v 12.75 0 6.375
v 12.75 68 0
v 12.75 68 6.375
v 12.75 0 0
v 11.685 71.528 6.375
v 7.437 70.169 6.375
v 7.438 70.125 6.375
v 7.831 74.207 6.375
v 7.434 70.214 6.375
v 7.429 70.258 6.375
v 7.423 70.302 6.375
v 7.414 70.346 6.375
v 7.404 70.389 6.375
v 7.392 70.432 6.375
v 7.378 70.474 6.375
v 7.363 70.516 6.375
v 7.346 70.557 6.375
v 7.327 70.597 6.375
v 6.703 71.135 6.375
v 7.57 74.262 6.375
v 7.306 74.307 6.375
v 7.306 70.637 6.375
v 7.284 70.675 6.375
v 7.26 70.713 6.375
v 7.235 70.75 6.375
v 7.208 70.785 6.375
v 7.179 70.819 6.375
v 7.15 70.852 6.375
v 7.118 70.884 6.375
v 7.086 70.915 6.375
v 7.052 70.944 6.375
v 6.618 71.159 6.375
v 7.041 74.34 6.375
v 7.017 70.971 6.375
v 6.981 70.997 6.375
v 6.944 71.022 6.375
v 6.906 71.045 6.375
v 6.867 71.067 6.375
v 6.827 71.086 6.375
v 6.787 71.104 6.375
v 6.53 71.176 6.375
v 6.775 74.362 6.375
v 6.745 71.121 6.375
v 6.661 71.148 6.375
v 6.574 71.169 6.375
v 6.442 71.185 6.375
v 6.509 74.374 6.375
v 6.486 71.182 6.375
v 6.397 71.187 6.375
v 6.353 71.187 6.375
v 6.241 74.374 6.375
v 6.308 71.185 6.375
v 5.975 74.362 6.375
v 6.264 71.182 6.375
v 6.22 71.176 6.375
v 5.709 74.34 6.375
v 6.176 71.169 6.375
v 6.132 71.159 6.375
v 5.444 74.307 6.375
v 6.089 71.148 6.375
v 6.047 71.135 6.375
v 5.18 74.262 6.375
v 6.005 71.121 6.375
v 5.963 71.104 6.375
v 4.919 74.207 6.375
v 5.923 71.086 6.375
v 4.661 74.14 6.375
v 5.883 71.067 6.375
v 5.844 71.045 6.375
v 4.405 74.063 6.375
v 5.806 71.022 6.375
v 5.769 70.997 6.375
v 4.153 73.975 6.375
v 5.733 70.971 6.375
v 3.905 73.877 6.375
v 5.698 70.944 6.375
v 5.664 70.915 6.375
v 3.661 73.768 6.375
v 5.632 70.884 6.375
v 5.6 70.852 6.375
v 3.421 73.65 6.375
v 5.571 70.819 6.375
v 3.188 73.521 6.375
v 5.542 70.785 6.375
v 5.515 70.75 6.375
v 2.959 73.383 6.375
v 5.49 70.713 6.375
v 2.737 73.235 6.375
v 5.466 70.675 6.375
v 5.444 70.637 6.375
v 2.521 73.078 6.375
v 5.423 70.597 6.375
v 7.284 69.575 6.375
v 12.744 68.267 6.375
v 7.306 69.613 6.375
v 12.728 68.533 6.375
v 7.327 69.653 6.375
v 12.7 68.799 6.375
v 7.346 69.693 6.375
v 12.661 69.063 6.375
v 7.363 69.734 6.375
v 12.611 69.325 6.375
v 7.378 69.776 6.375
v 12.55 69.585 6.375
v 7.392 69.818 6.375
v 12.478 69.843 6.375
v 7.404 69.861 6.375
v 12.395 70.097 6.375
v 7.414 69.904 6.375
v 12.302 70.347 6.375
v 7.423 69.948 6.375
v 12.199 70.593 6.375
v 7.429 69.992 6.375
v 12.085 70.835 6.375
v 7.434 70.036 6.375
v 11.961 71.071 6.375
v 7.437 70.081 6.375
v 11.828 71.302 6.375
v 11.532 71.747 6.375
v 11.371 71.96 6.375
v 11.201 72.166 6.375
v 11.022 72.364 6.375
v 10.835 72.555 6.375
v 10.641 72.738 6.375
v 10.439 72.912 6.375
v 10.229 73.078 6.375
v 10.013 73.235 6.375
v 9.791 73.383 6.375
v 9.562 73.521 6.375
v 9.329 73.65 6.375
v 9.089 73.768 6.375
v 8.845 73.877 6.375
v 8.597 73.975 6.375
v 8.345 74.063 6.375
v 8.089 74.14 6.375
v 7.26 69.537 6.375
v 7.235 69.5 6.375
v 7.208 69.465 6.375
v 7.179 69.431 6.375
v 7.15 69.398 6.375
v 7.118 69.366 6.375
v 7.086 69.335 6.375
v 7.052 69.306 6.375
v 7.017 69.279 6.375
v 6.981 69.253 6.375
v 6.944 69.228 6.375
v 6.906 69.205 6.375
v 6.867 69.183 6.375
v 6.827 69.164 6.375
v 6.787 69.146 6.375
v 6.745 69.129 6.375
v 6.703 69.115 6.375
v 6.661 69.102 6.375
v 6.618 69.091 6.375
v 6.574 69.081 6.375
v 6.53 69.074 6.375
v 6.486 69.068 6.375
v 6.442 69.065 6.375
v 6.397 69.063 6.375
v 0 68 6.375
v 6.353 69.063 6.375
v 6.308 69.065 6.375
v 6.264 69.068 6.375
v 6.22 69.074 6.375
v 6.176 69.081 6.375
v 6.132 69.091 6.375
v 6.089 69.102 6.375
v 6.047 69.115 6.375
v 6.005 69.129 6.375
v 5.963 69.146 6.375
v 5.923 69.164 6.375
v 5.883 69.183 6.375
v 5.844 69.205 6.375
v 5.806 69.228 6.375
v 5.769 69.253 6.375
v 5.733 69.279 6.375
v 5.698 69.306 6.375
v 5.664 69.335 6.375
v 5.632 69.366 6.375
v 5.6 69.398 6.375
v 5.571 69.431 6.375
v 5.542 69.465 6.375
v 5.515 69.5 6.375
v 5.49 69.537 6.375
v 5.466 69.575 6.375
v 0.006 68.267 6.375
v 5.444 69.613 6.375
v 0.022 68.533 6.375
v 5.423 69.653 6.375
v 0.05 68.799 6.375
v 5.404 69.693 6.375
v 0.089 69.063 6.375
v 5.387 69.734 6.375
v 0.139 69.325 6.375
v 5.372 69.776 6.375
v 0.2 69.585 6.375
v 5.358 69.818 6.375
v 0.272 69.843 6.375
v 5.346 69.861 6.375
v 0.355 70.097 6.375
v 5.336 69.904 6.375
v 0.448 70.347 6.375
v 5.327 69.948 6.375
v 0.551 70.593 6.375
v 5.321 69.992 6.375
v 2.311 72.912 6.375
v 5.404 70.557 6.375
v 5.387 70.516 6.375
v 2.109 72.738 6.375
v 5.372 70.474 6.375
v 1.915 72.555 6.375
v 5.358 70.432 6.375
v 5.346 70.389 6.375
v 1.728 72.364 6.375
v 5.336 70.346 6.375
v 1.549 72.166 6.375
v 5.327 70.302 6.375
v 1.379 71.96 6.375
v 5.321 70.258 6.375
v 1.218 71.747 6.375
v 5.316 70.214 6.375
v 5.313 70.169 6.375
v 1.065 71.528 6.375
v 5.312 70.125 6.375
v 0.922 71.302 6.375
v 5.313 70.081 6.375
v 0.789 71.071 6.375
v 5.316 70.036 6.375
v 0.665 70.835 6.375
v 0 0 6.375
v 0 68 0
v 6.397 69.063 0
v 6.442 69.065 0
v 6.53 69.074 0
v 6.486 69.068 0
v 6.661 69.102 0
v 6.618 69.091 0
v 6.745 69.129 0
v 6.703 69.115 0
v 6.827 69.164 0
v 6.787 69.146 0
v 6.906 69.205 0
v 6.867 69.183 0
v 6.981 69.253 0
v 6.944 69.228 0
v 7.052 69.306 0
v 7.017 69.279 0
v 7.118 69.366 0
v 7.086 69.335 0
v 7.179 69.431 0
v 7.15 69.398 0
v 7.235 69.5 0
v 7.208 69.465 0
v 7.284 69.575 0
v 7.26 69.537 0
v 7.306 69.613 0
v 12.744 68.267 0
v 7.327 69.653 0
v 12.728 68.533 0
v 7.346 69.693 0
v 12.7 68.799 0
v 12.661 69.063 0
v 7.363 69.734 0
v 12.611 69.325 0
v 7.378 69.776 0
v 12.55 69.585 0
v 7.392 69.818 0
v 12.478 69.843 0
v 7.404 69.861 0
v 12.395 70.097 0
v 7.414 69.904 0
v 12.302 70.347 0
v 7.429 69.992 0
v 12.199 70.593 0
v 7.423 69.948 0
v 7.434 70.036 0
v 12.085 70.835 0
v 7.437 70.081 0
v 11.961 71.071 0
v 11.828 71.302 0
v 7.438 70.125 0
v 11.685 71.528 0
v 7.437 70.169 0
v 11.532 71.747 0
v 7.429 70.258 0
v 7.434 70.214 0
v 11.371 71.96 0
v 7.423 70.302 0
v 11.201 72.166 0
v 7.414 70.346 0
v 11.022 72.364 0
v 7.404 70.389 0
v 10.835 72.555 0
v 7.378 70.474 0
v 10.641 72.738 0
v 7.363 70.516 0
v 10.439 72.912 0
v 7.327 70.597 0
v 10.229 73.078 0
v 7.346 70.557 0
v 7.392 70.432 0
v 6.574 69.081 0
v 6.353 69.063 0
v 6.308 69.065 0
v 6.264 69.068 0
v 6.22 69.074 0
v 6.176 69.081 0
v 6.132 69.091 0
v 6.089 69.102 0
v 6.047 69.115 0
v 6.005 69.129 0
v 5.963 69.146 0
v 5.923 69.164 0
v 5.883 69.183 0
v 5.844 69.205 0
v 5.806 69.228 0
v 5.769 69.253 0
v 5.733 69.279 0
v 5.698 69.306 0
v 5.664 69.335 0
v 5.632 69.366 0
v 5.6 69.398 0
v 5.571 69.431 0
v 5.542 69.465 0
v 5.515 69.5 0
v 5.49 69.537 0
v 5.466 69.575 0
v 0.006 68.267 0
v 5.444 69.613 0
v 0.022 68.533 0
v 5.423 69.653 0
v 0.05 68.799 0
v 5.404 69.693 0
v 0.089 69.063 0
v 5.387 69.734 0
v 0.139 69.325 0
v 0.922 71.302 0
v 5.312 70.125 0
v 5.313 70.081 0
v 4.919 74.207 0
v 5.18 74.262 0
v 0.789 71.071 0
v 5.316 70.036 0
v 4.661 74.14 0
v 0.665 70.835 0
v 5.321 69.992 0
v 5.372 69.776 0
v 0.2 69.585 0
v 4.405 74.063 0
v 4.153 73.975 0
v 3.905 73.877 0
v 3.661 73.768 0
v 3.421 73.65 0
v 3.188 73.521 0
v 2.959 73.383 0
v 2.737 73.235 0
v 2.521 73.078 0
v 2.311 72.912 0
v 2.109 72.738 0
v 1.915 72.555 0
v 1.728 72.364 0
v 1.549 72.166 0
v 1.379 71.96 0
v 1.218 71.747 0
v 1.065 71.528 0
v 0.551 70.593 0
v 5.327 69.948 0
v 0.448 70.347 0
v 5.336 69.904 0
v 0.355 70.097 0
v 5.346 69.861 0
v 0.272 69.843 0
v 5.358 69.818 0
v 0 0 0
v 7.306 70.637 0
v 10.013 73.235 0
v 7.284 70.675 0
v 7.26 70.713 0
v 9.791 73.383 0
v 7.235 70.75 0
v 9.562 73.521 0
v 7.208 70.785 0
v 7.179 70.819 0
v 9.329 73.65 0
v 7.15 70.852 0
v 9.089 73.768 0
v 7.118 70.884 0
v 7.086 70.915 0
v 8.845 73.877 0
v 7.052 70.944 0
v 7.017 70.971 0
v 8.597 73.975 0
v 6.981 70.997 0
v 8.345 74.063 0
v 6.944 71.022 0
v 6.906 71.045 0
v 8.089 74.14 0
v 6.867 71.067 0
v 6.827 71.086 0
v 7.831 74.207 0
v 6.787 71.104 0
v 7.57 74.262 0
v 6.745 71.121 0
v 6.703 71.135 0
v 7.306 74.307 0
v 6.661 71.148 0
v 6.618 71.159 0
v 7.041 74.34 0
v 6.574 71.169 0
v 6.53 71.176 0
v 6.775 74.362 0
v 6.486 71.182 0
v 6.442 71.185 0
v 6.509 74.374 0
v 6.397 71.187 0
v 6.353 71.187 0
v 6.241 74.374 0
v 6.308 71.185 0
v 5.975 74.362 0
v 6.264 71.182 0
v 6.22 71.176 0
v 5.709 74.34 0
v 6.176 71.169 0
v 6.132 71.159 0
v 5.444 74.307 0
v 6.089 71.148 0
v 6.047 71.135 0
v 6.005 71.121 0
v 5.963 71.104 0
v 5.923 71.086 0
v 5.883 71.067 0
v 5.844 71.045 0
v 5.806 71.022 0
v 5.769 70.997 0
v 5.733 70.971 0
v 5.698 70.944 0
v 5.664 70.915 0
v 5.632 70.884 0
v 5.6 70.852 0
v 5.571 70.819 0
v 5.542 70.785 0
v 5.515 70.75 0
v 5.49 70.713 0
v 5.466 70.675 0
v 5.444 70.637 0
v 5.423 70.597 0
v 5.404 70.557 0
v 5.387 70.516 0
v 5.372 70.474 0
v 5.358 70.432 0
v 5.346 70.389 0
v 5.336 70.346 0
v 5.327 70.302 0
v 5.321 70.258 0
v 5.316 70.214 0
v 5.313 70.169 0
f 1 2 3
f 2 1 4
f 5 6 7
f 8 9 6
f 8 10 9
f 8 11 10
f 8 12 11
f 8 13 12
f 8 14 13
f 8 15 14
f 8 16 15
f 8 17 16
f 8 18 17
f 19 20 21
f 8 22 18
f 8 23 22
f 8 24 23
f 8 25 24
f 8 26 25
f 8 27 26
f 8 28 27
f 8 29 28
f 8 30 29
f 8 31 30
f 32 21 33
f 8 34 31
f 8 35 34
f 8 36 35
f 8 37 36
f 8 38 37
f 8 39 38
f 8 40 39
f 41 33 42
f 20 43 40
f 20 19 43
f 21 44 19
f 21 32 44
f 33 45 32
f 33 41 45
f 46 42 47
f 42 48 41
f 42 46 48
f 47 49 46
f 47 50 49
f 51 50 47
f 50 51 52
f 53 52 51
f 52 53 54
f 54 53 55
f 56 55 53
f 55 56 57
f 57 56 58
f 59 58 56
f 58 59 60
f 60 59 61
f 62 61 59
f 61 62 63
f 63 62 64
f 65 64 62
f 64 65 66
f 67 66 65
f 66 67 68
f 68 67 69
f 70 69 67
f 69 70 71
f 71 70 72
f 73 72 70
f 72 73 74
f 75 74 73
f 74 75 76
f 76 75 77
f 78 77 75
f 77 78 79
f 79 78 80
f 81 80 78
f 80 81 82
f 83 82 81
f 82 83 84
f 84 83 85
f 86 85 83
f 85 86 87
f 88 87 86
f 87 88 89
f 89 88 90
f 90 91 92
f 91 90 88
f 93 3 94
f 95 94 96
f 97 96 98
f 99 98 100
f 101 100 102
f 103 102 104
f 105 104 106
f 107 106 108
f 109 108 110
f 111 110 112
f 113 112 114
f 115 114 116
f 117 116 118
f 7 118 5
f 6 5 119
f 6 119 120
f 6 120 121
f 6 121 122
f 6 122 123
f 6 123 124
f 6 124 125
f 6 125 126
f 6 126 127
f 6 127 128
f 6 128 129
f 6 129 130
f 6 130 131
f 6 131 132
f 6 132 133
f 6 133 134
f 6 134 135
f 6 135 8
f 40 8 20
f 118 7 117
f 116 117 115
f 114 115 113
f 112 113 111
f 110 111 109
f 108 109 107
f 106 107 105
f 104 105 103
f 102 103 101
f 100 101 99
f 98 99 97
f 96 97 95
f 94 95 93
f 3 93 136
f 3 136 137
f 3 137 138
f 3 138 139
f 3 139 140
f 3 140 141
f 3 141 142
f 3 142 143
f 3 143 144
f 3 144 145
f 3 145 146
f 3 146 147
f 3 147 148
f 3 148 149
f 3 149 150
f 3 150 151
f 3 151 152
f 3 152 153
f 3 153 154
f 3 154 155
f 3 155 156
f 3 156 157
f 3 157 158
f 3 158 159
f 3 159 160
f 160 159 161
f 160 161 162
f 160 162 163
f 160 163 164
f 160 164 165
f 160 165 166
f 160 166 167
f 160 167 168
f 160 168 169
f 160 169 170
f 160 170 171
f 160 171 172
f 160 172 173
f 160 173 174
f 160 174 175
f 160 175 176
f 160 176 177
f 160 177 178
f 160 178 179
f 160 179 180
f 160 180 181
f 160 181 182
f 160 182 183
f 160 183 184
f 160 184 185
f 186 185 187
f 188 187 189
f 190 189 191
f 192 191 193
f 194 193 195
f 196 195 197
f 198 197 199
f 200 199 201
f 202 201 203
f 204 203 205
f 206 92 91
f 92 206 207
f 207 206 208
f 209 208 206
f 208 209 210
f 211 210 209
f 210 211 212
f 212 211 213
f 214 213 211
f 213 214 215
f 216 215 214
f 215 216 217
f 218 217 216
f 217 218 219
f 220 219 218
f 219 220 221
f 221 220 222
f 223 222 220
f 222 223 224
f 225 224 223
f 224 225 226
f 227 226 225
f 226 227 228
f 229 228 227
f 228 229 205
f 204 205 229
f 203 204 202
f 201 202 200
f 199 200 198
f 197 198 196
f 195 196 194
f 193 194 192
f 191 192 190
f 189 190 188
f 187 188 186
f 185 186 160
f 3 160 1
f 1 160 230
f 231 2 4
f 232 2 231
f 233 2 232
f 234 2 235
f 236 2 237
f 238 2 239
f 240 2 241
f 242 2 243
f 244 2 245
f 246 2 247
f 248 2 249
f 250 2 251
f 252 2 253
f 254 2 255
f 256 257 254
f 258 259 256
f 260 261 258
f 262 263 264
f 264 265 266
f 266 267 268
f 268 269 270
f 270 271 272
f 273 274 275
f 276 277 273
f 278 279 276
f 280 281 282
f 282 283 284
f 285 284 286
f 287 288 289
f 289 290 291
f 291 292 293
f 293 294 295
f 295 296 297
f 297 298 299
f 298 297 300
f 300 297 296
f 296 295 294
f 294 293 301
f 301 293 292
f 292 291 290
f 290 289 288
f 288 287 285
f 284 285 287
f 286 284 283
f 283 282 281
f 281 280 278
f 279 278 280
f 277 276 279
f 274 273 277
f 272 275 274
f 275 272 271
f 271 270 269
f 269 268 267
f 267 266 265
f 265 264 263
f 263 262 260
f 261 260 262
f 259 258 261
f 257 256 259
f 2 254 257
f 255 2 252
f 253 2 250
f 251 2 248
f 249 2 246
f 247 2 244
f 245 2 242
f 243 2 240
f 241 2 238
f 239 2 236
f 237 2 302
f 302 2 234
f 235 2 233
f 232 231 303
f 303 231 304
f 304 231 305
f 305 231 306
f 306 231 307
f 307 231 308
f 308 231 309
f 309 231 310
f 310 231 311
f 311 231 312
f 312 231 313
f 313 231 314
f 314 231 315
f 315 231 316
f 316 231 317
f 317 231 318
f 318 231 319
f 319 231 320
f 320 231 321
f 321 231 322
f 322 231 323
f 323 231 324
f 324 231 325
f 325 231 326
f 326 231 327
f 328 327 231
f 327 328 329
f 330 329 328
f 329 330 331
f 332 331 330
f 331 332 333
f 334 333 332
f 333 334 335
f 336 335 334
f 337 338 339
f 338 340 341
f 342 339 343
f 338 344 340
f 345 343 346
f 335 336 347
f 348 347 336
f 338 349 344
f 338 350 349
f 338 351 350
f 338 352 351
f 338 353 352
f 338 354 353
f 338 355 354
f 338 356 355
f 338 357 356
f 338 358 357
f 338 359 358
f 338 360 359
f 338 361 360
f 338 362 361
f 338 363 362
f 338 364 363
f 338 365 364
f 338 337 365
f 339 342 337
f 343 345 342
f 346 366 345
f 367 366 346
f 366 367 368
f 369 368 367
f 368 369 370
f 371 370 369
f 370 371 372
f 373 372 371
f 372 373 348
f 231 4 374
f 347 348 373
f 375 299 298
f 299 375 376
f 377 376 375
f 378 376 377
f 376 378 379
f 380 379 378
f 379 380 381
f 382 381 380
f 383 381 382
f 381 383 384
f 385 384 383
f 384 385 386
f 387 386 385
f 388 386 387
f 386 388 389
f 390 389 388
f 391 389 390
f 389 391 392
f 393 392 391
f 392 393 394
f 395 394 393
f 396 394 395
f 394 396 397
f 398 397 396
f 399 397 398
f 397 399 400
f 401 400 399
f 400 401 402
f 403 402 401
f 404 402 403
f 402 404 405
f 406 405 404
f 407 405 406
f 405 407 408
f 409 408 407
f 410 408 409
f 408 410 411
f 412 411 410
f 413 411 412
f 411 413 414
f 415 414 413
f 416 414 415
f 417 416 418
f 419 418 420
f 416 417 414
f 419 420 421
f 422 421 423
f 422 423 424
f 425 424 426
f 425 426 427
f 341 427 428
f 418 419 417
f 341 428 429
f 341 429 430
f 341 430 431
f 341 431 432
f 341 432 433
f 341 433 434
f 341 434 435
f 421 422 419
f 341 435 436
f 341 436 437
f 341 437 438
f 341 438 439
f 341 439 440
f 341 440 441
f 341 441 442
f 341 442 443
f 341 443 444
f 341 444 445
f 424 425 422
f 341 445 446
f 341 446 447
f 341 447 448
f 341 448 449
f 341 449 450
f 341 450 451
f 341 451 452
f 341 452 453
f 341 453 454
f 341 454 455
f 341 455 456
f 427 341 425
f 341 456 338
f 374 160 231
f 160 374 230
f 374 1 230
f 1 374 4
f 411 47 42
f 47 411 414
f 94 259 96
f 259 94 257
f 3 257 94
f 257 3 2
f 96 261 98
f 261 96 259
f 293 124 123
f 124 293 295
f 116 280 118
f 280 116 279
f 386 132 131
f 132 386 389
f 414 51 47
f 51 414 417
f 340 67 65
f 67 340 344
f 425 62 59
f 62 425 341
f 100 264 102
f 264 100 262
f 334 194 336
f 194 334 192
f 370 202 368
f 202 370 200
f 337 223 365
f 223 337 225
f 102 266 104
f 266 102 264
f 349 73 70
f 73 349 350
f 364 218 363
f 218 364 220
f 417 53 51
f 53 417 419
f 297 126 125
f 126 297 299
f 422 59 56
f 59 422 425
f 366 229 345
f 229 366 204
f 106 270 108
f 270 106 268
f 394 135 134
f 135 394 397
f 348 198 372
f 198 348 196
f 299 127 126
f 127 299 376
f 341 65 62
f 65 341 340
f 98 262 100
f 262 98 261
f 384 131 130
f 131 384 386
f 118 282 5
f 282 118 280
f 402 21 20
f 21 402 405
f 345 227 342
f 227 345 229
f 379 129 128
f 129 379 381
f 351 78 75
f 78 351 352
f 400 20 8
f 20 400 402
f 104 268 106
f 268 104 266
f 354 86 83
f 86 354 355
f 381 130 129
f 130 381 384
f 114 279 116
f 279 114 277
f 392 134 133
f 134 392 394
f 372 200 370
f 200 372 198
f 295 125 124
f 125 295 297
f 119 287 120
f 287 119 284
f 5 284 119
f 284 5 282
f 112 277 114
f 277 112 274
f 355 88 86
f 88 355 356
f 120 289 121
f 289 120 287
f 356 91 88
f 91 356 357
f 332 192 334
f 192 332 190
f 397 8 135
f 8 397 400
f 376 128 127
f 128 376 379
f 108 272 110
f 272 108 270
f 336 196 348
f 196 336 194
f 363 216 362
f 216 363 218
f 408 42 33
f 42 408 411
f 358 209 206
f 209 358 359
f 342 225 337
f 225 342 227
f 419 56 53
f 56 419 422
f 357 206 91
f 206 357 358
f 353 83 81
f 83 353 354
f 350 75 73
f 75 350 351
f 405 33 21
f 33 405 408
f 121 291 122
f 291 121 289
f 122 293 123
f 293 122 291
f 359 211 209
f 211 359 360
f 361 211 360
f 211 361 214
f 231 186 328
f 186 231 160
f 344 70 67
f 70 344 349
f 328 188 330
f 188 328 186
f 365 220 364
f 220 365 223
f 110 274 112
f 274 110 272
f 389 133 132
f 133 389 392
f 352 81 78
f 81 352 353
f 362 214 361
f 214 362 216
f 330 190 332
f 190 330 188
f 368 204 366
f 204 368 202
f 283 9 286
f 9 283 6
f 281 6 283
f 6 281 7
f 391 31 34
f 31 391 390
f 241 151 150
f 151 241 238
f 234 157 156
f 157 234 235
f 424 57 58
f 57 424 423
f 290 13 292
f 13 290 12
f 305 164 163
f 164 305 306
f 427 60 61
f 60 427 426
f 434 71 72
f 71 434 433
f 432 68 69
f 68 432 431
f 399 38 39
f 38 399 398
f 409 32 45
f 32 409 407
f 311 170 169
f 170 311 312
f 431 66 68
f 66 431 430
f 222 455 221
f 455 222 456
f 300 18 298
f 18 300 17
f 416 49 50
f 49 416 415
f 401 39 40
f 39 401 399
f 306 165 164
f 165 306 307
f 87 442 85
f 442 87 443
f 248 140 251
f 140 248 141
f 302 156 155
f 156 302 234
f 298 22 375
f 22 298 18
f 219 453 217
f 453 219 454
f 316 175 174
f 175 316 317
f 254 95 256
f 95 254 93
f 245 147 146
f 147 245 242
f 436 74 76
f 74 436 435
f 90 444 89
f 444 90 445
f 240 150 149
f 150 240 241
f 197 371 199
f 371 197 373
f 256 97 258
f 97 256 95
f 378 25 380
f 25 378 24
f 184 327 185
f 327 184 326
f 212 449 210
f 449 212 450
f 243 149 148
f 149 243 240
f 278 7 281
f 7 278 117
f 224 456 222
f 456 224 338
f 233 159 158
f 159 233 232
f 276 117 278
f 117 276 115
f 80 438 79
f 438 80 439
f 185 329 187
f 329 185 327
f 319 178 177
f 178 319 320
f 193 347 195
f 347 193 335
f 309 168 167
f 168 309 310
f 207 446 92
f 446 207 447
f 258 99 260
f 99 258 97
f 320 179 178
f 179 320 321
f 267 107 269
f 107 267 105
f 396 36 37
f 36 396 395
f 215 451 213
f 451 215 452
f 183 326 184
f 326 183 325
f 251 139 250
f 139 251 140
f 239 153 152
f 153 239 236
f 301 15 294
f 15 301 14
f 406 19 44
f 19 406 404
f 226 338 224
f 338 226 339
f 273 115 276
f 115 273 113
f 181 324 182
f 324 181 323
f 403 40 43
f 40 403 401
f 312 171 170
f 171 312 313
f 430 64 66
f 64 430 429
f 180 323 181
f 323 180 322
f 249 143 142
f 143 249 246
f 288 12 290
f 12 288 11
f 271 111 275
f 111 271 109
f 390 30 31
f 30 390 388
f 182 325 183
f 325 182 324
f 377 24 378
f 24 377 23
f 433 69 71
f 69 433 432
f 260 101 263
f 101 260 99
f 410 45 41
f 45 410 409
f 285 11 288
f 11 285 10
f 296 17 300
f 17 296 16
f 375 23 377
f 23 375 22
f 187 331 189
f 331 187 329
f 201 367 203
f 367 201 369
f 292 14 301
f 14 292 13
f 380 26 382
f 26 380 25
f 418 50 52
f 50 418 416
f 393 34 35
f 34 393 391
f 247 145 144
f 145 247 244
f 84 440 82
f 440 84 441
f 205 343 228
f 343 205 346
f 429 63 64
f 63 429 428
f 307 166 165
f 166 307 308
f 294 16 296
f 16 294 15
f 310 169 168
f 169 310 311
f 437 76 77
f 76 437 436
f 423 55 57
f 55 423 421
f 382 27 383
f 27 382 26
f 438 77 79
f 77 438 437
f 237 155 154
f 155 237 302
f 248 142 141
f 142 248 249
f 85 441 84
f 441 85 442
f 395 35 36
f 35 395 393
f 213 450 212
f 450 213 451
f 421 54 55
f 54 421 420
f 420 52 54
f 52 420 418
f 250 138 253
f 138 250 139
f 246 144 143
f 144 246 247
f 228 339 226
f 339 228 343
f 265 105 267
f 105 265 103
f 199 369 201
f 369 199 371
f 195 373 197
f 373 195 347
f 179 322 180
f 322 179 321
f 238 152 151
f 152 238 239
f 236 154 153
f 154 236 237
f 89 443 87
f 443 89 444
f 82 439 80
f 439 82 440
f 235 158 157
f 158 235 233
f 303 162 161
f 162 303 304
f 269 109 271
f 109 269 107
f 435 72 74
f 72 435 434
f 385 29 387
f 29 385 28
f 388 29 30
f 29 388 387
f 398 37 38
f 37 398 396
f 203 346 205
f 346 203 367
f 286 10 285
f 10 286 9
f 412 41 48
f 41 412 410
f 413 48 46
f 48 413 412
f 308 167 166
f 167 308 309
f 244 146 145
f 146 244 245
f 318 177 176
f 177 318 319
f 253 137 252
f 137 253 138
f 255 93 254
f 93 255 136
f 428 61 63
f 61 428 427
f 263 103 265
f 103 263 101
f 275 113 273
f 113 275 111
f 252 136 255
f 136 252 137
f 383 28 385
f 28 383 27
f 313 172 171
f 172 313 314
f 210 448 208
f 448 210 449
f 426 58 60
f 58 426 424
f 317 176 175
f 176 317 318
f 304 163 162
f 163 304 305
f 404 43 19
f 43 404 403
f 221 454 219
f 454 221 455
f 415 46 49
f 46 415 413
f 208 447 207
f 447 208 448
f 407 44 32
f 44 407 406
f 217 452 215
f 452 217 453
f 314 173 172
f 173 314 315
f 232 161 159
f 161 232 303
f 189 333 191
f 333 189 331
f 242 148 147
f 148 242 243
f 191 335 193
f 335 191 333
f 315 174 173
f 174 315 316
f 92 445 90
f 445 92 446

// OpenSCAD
$fn = 150;

difference() {
	union() {
		cube(size = [12.75, 68.0, 6.375]);
		translate(v = [6.375, 68.0, 0]) {
			cylinder(d = 12.75, h = 6.375);
		}
	}
	translate(v = [6.375, 70.125, -1]) {
		cylinder(d = 2.125, h = 8.375);
	}
}
